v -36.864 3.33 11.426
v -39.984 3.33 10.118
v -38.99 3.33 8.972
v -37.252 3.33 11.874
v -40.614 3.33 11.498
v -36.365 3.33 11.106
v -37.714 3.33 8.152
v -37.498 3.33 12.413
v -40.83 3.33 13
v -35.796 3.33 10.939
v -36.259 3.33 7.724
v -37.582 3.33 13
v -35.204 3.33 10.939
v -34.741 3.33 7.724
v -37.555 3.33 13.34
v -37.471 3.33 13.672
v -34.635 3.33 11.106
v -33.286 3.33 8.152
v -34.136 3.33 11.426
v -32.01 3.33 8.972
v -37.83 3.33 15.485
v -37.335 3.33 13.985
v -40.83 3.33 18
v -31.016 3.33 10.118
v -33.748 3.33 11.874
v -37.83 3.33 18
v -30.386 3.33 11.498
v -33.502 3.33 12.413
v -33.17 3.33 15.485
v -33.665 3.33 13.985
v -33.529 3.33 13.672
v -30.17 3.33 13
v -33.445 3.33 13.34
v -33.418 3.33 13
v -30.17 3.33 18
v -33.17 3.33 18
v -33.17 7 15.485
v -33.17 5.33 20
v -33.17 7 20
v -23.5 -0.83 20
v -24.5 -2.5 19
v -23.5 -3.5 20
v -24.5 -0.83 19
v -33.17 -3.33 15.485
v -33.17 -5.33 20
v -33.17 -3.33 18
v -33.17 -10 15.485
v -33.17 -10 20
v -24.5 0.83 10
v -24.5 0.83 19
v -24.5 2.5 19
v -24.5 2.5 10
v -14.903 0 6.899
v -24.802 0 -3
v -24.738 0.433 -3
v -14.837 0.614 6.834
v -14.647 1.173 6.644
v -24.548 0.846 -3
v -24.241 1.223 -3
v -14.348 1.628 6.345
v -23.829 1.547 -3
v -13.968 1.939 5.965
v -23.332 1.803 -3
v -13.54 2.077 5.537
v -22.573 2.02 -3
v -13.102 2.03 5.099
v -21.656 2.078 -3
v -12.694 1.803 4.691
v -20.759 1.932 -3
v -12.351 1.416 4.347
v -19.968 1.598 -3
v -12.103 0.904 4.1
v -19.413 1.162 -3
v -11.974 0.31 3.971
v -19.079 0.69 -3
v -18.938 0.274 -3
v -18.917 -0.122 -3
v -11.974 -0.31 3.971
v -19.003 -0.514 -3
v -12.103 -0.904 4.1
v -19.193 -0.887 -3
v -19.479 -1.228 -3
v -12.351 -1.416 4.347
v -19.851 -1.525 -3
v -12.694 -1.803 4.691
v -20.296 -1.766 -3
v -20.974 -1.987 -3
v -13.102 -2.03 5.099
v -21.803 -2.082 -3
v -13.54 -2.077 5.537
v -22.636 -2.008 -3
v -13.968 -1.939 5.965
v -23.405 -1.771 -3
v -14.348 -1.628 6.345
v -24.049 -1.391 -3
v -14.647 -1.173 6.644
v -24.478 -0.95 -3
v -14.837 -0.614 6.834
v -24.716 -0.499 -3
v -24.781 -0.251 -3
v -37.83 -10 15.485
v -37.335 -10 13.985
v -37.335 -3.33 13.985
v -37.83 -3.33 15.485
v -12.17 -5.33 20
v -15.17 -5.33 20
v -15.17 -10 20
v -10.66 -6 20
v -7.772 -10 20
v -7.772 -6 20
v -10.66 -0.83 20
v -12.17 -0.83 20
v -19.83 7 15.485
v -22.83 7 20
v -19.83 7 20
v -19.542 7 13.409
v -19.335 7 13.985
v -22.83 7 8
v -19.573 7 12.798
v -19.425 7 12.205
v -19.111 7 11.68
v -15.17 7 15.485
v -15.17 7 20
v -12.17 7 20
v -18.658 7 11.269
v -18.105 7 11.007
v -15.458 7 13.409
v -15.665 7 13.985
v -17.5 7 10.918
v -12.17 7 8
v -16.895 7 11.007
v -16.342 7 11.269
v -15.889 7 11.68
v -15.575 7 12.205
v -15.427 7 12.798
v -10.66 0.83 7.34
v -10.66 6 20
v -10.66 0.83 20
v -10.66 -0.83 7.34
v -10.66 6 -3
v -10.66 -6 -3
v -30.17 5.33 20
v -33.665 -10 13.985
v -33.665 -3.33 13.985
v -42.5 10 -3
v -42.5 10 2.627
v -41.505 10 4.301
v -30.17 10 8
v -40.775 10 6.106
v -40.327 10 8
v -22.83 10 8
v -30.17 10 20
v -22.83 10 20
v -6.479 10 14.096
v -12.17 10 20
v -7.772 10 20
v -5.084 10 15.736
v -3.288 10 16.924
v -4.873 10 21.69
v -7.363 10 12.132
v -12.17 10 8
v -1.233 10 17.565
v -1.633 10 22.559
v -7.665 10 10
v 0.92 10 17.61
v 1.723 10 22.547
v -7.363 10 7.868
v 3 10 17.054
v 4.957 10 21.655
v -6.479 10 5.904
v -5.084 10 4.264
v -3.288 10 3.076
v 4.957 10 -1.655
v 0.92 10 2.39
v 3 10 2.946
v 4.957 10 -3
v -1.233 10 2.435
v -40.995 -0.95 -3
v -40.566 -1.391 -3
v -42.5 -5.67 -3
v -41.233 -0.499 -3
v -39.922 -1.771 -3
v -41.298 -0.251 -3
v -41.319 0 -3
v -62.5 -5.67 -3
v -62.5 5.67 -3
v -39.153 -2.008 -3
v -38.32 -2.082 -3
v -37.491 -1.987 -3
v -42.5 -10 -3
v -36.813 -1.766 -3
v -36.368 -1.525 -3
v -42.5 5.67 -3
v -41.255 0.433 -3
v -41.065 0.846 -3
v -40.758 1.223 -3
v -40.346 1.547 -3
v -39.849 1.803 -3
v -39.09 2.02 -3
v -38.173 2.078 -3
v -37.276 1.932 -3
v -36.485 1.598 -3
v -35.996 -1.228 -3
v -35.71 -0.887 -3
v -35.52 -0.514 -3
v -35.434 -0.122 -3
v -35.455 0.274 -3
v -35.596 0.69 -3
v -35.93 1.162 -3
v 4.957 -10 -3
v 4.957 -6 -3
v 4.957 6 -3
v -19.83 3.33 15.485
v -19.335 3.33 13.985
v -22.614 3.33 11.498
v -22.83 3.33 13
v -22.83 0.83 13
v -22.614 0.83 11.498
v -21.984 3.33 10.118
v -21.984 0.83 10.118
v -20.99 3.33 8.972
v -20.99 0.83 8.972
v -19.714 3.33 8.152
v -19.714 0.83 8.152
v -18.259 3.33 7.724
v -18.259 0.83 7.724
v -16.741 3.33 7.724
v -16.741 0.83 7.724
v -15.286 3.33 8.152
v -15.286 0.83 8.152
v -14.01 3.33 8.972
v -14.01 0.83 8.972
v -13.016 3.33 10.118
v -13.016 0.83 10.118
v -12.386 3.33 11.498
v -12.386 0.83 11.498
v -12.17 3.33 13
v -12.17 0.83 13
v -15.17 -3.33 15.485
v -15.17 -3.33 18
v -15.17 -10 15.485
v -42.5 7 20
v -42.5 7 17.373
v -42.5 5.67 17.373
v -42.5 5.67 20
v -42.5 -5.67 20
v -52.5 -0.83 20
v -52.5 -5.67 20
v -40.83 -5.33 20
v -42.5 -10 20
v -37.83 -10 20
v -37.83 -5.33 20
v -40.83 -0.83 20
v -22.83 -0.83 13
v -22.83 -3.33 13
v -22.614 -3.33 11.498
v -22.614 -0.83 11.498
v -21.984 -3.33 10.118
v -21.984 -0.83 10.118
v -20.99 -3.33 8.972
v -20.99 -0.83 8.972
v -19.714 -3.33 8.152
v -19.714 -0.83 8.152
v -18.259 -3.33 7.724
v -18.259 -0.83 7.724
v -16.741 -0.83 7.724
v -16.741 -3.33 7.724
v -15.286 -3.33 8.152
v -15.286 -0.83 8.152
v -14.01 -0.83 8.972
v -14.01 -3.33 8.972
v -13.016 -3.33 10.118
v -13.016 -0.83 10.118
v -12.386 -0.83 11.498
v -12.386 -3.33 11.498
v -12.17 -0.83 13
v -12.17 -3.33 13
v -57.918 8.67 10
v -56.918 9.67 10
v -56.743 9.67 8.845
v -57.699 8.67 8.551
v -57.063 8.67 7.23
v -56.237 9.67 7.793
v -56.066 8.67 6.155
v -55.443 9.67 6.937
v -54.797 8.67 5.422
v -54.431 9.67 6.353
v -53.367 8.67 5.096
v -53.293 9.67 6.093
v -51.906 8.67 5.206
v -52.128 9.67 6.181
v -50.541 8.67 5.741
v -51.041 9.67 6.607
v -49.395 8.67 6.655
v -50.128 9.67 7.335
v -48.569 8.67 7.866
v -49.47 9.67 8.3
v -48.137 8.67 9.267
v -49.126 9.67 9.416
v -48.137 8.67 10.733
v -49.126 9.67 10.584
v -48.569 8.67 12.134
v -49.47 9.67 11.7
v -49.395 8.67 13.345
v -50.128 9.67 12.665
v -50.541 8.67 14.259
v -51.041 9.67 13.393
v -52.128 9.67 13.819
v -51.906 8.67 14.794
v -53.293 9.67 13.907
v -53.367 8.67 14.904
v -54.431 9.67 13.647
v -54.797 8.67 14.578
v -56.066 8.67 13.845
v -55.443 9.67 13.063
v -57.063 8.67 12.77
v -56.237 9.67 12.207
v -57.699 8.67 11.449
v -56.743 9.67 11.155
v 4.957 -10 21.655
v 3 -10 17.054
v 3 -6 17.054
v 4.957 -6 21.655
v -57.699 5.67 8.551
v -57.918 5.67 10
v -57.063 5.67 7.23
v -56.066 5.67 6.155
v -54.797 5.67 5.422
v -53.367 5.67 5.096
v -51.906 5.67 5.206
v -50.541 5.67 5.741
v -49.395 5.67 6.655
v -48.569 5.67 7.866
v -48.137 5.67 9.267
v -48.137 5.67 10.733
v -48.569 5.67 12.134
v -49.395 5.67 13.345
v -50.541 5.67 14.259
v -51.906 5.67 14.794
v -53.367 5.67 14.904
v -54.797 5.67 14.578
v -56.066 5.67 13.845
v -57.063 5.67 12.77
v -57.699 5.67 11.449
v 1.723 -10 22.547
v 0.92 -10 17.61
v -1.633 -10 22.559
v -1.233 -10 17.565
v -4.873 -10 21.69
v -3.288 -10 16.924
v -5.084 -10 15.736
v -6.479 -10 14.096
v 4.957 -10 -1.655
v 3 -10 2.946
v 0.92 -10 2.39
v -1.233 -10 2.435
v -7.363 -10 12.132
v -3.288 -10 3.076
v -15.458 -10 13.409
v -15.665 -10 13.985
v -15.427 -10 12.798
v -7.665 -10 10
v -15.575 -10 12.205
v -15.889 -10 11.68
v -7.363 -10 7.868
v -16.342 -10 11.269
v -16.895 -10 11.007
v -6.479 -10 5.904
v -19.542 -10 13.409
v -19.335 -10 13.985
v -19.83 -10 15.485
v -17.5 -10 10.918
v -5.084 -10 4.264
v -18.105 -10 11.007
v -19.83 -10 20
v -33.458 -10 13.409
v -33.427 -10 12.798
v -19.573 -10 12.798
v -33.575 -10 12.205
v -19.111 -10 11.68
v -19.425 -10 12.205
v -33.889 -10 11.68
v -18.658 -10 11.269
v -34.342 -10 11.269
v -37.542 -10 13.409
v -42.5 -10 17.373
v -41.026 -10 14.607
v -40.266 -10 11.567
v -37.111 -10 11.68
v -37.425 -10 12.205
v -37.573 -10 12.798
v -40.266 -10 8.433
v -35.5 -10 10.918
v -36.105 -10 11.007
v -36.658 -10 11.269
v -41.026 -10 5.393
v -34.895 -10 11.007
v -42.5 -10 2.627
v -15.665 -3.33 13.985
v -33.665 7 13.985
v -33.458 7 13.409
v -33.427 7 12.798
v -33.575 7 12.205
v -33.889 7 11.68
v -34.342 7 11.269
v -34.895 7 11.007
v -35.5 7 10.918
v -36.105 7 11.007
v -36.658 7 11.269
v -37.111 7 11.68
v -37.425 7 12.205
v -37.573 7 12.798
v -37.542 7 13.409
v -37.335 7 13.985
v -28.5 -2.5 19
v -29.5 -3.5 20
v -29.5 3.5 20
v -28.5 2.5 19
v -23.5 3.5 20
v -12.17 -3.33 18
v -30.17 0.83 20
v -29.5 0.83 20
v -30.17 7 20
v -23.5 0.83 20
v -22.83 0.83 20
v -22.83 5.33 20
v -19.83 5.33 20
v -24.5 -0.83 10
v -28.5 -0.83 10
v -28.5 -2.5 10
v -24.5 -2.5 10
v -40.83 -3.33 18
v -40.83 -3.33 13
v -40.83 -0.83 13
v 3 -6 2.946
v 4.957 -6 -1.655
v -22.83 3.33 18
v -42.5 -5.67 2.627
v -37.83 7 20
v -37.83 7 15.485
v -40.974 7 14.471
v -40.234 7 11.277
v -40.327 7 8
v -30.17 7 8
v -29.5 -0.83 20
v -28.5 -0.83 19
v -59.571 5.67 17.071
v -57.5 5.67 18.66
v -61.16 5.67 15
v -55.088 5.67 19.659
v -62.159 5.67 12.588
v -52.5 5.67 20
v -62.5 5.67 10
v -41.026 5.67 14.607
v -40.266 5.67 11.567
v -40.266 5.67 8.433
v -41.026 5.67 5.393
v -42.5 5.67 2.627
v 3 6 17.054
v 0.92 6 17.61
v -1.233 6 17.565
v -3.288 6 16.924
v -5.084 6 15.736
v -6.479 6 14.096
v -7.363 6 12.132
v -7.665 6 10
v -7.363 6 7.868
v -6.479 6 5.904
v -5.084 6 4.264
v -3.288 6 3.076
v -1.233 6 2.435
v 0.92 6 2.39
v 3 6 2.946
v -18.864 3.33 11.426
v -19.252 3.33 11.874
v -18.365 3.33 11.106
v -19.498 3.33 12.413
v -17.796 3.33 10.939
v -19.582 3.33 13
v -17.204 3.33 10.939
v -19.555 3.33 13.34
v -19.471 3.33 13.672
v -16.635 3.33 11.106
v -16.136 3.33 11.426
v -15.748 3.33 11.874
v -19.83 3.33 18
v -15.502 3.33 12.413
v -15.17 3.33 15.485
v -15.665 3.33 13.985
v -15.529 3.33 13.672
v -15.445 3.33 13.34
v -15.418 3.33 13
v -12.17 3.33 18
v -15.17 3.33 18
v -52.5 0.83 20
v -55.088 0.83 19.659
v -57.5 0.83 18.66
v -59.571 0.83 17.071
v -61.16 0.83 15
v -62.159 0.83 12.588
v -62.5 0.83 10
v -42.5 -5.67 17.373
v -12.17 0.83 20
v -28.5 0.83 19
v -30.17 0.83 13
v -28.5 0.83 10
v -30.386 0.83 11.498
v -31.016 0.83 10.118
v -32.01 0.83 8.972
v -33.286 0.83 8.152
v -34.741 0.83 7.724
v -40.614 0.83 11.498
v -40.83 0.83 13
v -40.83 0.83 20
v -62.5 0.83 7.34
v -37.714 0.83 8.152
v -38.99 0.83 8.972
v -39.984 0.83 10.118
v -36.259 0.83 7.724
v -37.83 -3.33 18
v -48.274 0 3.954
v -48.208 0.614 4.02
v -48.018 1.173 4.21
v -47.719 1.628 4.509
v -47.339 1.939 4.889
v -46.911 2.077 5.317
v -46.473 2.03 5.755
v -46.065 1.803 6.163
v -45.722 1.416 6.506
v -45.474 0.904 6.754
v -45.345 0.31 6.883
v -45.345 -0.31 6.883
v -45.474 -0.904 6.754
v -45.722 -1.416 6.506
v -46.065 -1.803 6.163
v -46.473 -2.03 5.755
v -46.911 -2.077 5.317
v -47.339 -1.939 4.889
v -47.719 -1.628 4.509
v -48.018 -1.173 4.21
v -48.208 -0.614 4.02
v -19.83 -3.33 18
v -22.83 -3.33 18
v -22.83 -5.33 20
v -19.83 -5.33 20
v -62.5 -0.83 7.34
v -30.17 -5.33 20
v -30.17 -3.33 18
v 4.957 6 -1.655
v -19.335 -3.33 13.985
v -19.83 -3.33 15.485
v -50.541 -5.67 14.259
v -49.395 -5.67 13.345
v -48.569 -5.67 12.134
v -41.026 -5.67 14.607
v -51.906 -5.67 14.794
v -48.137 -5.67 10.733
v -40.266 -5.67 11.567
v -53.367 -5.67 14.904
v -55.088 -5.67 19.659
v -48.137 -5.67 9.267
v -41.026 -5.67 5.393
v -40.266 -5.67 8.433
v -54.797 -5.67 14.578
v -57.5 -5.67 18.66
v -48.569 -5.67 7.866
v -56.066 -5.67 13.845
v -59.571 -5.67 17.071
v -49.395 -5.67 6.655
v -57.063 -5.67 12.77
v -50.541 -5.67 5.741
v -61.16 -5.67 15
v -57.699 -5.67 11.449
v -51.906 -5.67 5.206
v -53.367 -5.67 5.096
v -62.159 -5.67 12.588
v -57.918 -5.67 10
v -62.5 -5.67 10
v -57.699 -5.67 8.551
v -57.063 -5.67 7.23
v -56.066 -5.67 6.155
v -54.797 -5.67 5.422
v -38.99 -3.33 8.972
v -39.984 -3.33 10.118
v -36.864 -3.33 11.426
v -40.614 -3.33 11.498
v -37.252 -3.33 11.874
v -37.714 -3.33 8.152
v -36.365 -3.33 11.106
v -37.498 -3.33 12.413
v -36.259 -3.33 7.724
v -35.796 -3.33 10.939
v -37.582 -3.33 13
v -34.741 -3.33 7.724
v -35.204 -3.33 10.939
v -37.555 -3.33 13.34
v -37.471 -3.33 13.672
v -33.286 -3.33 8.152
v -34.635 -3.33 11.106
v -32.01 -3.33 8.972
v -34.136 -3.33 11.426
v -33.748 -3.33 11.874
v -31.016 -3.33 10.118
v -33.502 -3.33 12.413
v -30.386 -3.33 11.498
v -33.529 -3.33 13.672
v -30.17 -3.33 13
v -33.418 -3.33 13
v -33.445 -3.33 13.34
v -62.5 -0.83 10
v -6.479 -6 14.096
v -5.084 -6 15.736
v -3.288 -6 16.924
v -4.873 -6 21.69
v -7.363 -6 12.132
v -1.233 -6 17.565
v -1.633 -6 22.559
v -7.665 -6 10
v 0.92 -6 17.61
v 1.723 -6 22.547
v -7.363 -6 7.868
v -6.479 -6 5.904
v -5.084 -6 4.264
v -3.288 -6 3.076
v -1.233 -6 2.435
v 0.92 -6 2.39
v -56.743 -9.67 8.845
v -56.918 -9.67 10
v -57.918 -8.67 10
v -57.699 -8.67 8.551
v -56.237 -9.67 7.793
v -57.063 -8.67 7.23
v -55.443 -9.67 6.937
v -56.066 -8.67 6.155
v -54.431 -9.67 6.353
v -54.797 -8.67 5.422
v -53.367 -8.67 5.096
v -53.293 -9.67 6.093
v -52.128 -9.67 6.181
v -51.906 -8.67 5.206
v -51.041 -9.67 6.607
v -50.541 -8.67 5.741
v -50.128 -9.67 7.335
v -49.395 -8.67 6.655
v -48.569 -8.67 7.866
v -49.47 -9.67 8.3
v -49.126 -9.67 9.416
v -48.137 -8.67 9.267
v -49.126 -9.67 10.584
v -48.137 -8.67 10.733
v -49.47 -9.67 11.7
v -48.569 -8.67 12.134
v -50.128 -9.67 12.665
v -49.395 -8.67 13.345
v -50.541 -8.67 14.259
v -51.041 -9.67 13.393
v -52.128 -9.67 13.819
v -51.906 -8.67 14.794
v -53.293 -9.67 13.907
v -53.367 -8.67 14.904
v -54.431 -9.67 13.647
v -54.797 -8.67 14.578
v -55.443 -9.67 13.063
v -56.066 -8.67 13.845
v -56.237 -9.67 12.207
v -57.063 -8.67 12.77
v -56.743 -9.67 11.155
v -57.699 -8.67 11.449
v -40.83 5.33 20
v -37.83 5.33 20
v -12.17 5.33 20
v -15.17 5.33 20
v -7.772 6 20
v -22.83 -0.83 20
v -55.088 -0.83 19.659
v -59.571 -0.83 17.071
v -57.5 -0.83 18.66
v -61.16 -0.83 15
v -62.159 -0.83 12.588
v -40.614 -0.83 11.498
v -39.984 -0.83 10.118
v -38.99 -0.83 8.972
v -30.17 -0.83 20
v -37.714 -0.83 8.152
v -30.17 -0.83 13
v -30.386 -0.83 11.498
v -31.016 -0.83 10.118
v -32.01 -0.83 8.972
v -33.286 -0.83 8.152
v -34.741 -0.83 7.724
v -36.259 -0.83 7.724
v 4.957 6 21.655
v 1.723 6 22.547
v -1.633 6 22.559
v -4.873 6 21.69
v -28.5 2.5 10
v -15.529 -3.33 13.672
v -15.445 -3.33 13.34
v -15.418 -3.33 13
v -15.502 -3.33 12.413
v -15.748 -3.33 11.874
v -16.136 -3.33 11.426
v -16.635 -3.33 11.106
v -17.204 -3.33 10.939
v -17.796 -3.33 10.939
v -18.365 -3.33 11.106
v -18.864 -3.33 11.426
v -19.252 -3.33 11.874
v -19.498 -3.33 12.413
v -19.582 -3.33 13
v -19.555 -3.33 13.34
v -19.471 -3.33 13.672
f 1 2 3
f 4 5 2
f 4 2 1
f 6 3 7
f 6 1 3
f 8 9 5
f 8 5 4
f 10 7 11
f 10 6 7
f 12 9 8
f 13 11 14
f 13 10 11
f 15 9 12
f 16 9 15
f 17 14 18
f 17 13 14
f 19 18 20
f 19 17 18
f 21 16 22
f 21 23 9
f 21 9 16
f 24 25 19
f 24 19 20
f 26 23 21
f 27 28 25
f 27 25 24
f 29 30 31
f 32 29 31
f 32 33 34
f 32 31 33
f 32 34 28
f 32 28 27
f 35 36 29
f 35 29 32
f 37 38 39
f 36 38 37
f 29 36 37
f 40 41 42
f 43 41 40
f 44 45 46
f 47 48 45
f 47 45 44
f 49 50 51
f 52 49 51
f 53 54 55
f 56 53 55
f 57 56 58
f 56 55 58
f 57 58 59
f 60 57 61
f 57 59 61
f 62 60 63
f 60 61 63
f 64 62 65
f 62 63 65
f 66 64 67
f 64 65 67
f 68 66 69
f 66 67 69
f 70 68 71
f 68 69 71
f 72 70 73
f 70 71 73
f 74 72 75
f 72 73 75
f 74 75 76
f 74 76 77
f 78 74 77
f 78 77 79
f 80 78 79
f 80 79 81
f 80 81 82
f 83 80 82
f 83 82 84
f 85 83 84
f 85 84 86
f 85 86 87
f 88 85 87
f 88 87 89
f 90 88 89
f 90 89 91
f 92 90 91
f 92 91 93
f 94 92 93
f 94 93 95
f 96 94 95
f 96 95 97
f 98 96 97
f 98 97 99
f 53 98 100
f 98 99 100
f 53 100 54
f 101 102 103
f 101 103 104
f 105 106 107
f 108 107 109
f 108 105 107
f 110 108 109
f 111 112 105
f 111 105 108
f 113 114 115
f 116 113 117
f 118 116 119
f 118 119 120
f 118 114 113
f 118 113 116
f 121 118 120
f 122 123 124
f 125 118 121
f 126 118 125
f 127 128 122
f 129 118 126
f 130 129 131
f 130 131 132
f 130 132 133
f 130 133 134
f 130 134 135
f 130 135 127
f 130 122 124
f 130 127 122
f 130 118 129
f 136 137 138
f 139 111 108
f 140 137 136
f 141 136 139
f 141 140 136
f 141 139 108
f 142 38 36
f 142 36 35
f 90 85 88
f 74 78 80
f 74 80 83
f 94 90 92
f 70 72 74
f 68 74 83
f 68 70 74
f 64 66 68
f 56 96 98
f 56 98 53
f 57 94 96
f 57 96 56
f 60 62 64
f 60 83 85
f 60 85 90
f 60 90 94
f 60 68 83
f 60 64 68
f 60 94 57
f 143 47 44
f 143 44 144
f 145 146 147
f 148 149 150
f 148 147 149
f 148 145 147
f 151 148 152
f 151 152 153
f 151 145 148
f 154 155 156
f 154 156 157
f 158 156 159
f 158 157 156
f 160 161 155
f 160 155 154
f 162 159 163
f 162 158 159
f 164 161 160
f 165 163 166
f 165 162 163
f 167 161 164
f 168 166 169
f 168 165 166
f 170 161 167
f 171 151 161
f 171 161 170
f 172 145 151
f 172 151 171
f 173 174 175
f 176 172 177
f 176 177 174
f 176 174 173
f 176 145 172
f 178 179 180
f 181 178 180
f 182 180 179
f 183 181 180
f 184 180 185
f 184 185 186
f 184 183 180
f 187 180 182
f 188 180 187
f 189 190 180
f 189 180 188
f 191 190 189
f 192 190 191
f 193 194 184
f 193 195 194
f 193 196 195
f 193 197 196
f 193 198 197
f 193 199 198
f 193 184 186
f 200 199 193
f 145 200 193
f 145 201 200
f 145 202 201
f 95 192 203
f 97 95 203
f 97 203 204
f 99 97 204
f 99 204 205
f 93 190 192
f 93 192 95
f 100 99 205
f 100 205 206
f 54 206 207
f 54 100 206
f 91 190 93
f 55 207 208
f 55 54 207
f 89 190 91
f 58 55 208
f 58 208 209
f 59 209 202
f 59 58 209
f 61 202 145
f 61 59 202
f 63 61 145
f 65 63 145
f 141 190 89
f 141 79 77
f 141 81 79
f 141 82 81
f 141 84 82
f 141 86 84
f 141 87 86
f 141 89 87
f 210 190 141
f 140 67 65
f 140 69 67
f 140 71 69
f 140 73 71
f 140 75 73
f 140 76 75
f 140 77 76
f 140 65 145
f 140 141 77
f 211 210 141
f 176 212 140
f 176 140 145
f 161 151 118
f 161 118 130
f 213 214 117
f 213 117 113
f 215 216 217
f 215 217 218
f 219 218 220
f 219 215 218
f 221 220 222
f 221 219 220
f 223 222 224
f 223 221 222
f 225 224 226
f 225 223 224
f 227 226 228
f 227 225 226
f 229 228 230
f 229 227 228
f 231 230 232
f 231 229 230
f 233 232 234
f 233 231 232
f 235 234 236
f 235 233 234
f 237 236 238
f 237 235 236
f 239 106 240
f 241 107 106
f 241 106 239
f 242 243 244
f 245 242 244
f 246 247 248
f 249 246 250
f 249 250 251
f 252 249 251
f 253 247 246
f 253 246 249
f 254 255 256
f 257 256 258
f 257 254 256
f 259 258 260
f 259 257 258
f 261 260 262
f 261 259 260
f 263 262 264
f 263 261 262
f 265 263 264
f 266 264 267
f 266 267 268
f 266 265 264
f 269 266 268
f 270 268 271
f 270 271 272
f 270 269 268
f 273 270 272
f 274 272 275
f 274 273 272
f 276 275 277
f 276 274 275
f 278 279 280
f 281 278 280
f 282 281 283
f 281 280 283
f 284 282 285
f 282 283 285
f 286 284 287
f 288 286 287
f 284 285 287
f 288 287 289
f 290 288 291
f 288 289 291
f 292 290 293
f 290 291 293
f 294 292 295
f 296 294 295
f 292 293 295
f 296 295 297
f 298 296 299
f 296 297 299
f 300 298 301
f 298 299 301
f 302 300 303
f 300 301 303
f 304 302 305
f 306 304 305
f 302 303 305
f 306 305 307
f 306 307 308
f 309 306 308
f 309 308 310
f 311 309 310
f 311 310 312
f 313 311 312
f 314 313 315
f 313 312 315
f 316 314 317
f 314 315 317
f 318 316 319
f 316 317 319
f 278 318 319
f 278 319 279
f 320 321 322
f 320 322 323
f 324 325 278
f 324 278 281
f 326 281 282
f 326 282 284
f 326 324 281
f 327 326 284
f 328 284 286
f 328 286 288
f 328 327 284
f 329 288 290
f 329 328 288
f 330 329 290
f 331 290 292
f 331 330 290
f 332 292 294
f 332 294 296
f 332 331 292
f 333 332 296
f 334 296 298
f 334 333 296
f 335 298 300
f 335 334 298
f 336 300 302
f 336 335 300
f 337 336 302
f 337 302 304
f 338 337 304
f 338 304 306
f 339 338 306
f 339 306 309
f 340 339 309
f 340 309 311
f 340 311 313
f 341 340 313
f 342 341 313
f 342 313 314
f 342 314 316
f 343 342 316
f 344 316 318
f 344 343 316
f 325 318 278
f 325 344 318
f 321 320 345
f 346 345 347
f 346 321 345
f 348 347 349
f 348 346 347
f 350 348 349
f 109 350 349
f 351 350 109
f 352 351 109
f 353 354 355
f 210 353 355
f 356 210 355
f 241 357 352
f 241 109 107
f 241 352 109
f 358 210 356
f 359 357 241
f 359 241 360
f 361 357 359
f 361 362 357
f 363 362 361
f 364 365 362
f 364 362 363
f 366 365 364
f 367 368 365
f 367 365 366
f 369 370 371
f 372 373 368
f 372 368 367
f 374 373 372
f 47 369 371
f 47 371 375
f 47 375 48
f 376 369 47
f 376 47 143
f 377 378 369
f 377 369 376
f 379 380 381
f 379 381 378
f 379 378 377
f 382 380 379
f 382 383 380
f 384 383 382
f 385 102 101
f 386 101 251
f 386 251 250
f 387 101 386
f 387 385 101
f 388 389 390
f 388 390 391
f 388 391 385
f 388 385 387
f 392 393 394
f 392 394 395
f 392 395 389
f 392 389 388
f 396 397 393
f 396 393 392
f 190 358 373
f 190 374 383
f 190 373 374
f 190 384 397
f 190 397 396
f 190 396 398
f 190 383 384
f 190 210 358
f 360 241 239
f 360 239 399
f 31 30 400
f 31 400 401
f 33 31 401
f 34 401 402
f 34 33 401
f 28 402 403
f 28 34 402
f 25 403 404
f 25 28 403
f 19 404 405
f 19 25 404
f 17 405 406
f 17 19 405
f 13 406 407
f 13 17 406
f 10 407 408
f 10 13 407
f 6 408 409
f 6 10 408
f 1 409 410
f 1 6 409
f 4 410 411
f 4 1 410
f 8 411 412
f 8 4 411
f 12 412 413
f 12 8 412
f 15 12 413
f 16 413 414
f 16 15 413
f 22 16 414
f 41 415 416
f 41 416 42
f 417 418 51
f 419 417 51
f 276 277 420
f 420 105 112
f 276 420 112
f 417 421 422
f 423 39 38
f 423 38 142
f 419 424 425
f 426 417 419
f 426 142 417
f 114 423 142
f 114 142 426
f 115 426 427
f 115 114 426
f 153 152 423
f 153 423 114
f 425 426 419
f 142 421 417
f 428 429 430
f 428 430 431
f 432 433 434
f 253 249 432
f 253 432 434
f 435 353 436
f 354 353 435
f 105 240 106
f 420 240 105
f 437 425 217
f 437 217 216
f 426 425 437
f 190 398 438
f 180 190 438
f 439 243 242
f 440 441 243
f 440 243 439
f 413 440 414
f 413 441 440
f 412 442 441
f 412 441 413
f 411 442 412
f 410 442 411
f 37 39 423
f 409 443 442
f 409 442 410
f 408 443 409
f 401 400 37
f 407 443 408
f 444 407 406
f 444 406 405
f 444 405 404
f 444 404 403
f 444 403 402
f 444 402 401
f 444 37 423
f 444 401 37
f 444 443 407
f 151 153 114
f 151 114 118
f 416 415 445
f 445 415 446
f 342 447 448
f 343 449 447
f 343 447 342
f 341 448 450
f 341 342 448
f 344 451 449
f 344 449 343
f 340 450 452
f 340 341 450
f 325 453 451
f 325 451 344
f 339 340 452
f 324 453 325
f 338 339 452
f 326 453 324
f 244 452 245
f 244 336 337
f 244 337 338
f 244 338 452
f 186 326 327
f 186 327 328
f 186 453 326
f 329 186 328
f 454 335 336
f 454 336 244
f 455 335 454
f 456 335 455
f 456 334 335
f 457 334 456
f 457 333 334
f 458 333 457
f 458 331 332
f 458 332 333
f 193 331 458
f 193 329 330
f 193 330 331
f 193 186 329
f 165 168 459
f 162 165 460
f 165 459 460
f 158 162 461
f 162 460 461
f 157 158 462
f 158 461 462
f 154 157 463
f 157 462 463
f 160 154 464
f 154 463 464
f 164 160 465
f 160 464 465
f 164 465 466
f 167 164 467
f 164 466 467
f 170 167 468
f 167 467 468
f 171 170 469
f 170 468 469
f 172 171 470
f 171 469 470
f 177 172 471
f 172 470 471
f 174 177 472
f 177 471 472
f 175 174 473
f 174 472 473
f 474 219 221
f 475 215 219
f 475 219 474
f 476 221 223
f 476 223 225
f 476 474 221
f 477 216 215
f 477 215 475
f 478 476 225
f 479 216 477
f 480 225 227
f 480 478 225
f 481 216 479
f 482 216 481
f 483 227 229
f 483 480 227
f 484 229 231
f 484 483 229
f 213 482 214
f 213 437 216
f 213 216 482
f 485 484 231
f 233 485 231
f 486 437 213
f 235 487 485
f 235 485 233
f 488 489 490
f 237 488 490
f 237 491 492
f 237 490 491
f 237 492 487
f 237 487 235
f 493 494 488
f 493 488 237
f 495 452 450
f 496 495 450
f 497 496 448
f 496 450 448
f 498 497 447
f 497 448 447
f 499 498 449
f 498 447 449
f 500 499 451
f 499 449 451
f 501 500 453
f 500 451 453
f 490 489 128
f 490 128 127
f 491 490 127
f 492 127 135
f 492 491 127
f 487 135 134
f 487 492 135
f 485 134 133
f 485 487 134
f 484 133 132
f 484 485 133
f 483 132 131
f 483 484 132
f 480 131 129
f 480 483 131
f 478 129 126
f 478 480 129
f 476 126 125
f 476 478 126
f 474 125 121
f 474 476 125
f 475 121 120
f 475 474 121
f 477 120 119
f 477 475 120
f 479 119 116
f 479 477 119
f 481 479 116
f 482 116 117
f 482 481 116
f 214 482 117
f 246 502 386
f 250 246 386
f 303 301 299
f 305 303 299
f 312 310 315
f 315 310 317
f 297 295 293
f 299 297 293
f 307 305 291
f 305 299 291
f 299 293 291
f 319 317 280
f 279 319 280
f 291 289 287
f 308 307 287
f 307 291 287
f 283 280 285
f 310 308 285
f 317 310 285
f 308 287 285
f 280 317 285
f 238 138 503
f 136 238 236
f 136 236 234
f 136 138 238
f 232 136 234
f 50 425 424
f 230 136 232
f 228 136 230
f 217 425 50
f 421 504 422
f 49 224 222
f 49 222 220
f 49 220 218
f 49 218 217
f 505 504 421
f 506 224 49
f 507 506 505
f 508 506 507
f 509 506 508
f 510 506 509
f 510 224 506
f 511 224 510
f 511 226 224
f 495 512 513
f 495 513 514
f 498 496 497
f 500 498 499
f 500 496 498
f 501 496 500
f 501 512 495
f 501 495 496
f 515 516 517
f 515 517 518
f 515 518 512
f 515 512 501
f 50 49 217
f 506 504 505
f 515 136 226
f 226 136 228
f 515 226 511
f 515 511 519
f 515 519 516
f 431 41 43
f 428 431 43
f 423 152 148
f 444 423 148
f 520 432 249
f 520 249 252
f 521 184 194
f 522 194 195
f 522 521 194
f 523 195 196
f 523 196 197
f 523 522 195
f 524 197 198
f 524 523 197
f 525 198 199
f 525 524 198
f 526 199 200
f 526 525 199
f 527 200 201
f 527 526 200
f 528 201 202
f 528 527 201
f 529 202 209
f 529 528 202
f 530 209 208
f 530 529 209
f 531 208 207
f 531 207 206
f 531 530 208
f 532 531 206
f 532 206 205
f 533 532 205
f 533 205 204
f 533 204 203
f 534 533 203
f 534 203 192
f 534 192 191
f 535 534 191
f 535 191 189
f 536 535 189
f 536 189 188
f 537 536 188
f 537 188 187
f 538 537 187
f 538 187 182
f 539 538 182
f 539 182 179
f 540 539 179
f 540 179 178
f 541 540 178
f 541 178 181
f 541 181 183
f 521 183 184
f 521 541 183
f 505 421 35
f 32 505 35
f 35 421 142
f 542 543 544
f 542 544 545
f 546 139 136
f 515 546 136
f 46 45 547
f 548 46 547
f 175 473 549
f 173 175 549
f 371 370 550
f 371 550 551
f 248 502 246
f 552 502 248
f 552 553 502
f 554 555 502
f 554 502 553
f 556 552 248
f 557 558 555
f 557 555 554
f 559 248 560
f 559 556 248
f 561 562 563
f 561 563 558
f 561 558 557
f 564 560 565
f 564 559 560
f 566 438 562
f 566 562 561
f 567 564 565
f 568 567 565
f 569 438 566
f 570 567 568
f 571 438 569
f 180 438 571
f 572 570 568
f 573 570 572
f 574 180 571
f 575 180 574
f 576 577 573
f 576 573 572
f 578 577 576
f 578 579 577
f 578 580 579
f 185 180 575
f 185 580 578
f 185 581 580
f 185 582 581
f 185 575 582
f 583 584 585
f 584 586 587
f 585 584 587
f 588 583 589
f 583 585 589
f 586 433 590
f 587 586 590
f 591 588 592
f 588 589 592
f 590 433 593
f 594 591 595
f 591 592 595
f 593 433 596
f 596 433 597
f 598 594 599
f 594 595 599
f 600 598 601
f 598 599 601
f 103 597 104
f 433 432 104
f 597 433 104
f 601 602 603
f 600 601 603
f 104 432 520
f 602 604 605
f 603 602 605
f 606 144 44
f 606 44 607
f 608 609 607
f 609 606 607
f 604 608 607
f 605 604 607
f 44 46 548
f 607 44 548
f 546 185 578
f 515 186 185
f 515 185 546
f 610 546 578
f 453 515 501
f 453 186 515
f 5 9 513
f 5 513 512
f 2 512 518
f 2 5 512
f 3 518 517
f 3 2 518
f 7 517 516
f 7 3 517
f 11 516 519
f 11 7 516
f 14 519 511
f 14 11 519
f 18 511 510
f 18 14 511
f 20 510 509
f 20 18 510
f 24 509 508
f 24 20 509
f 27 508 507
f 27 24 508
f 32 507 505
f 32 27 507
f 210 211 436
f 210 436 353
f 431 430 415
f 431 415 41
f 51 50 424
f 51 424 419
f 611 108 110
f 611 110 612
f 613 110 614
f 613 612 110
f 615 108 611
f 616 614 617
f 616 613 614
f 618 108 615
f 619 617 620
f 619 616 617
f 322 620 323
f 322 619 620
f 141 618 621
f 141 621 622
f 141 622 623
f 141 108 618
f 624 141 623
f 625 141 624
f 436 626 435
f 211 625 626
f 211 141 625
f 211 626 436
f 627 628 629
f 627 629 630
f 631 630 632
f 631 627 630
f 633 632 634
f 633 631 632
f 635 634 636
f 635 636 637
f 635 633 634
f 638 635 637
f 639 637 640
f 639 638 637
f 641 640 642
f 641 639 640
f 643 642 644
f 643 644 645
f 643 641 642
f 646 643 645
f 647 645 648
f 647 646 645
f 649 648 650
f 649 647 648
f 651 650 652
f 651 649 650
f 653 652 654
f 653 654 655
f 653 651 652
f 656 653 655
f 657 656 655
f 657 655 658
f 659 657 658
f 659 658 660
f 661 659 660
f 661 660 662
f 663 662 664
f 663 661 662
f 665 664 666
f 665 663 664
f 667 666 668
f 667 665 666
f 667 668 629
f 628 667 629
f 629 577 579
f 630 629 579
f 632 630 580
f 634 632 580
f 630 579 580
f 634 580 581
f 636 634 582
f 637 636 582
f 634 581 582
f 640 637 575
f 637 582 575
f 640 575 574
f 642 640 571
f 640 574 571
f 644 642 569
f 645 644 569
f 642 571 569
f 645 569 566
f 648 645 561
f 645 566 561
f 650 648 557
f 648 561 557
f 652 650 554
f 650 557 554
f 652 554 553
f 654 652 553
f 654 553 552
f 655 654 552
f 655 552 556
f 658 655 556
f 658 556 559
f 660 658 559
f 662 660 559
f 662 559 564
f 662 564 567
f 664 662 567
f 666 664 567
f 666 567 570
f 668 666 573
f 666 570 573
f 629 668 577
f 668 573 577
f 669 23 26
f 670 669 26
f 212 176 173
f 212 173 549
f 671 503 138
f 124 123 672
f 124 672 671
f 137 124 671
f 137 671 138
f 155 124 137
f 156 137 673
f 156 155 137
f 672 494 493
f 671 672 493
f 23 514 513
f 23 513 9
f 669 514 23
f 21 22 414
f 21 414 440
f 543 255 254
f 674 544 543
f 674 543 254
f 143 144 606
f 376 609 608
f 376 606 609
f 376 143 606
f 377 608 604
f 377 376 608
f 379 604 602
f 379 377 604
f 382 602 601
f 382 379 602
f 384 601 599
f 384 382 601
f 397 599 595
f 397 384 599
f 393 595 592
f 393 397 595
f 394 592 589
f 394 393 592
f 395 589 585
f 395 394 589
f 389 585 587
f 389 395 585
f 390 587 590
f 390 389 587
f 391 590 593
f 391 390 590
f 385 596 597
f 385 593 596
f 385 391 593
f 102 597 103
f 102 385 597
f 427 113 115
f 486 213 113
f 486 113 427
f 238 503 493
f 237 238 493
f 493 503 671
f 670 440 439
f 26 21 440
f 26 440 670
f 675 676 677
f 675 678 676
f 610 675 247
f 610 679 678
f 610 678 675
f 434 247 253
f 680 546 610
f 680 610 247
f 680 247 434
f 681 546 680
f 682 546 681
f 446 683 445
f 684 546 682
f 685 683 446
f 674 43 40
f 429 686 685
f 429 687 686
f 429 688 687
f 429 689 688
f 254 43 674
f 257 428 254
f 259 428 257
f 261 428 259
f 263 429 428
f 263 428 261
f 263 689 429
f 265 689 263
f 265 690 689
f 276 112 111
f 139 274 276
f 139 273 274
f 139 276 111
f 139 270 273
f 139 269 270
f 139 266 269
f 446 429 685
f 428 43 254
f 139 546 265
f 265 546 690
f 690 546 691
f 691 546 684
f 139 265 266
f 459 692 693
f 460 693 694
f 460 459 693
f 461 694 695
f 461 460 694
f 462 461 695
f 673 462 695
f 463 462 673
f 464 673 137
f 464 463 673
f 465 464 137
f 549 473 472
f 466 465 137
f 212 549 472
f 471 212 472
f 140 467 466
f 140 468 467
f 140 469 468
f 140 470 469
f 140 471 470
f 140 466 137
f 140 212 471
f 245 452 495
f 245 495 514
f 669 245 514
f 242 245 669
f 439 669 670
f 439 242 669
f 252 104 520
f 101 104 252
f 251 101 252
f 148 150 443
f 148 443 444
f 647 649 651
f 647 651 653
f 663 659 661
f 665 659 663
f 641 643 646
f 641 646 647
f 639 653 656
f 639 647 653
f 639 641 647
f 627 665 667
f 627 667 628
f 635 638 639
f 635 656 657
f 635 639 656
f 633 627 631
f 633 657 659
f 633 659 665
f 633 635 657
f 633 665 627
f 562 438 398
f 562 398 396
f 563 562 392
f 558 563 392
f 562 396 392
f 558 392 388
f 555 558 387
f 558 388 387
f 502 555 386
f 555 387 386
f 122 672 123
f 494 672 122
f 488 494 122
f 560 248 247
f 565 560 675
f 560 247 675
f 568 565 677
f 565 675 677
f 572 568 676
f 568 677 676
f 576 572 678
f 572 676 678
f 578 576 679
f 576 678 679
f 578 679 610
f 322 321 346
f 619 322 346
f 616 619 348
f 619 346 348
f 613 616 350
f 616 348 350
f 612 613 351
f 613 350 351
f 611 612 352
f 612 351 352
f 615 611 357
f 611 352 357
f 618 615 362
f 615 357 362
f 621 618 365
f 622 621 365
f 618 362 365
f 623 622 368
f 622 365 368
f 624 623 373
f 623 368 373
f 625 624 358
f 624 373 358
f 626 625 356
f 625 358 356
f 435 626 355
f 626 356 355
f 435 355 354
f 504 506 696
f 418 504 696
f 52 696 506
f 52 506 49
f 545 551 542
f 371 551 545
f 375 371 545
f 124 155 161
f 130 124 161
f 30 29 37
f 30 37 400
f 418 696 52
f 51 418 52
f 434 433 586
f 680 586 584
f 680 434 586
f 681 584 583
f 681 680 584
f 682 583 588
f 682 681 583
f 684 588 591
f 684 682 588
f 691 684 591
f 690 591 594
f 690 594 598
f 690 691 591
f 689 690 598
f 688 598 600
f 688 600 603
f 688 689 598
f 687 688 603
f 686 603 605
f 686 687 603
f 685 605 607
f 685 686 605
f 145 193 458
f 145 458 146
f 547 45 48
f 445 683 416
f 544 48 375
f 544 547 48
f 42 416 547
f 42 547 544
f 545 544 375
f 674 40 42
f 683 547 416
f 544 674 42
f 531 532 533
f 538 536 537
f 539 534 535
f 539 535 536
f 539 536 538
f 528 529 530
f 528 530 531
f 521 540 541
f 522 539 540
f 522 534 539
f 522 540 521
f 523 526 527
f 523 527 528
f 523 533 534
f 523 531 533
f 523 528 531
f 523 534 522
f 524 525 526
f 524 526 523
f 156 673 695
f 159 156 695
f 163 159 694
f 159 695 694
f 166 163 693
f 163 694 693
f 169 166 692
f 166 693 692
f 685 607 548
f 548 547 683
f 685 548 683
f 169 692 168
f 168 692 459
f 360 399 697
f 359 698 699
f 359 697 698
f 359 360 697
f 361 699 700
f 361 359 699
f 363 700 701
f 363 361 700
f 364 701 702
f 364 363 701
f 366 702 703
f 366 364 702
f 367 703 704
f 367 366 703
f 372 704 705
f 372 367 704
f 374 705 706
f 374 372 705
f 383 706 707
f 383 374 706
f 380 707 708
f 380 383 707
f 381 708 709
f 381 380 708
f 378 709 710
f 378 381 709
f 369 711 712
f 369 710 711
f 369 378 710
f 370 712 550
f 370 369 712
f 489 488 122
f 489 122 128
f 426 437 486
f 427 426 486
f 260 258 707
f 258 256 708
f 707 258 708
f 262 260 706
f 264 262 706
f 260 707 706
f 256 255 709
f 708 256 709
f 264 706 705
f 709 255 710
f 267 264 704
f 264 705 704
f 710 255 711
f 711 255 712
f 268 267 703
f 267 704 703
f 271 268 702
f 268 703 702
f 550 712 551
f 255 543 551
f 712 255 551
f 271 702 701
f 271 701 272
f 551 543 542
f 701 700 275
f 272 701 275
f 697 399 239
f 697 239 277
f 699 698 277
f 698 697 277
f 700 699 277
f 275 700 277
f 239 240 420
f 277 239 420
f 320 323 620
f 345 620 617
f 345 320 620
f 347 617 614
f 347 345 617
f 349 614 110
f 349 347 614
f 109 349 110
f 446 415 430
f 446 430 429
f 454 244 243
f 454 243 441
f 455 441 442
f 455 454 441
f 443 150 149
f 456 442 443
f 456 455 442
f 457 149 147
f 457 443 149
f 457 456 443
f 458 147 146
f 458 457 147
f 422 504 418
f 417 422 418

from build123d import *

# Parameters (mm, degrees)
BOSS_EXTRUDE7_DEPTH      = 20
SKETCH2_R                = 4.9175
BOSS_EXTRUDE2_DEPTH      = 4
CUT_EXTRUDE1_REACH       = 70.602
SKETCH3_R                = 7.665
SKETCH4_W                = 4
SKETCH4_H                = 5
CUT_EXTRUDE2_DEPTH       = 10
BOSS_EXTRUDE4_DEPTH      = 4
BOSS_EXTRUDE5_START      = -4
BOSS_EXTRUDE5_DEPTH      = 4
SKETCH25_R               = 12.83
SKETCH25_R_2             = 4.9175
CUT_EXTRUDE9_DEPTH       = 4.33
CUT_EXTRUDE10_START      = -4.33
CUT_EXTRUDE10_DEPTH      = 4.33
CUT_EXTRUDE5_DEPTH       = 70.42587576
SKETCH17_W               = 10.66
SKETCH17_H               = 6.66
CUT_EXTRUDE6_DEPTH       = 7
SKETCH18_W               = 3.2475
SKETCH18_H               = 6.66
SKETCH19_W               = 3.2475
SKETCH19_H               = 6.66
SKETCH20_W               = 51.84
SKETCH20_H               = 1.66
CUT_EXTRUDE7_DEPTH       = 12.66
CHAMFER2_SIZE            = 1
CHAMFER3_SIZE            = 1
CHAMFER4_SIZE            = 2
FILLET1_R                = 10
BOSS_EXTRUDE13_REACH     = 70.3
SKETCH23_W               = 10.34
SKETCH23_H               = 1.66
BOSS_EXTRUDE14_DEPTH     = 0.360269713
SKETCH24_W               = 12.33
SKETCH24_H               = 12
SKETCH24_W_2             = 10.66
CUT_EXTRUDE8_DEPTH       = 3
CHAMFER5_SIZE            = 1
CUT_EXTRUDE11_DEPTH      = 14
CUT_EXTRUDE11_DEPTH_BACK = 14
SKETCH27_R               = 2.0825
SKETCH28_R               = 2.0825
CUT_EXTRUDE12_DEPTH      = 14


with BuildPart() as part:
    # Sketch16 → Boss-Extrude7 (new body)
    with BuildSketch(Plane.XY):
        Polygon((-42.5, -10), (0, -10), (3, -10), (3, -6), (0, -6), (-10.66, -6), (-10.66, 6), (0, 6), (3, 6), (3, 10), (0, 10), (-42.5, 10), (-42.5, 5.67), (-53, 5.67), (-62.5, 5.67), (-62.5, -5.67), (-53, -5.67), (-42.5, -5.67), align=None)
    extrude(amount=BOSS_EXTRUDE7_DEPTH)

    # Sketch2 → Boss-Extrude2 (add)
    with BuildSketch(Plane.XZ.offset(5.67)):
        with Locations(Location((-53, 10, 0), (0, 0, 180))):
            Circle(SKETCH2_R)
    boss_extrude2 = extrude(amount=BOSS_EXTRUDE2_DEPTH)

    # Cut-Extrude1: up to this face of the body (flat: up to its plane)
    cut_extrude1_end = Plane(part.part.faces().sort_by_distance((-19.75, 10, 10))[0])
    # Sketch3 → Cut-Extrude1 (cut, up to the picked face)
    with BuildSketch(Plane.XZ.offset(10), mode=Mode.PRIVATE) as cut_extrude1_sk1:
        with Locations((0, 10)):
            Circle(SKETCH3_R)
    cut_extrude1_tool1 = split(extrude(cut_extrude1_sk1.sketch, amount=-CUT_EXTRUDE1_REACH, mode=Mode.PRIVATE), bisect_by=cut_extrude1_end, keep=Keep.BOTH, mode=Mode.PRIVATE)
    add(cut_extrude1_tool1.solids().sort_by(Axis((0, -10, 10), (0, 1, 0)))[0], mode=Mode.SUBTRACT)

    # Mirror1: Boss-Extrude2 across plane
    add(boss_extrude2.mirror(Plane.ZX))

    # Sketch4 → Cut-Extrude2 (cut)
    with BuildSketch(Plane.XY.offset(20)):
        with Locations((-26.5, 0)):
            Rectangle(SKETCH4_W, SKETCH4_H)
    extrude(amount=-CUT_EXTRUDE2_DEPTH, mode=Mode.SUBTRACT)

    # Sketch10 → Boss-Extrude4 (add)
    with BuildSketch(Plane.XZ.offset(10)):
        with BuildLine():
            Line((3, 17.053525714), (4.956947162, 21.654651425))
            ThreePointArc((4.956947162, 21.654651425), (-12.665, 10), (4.956947162, -1.654651425))
            Line((4.956947162, -1.654651425), (3, 2.946474286))
            ThreePointArc((3, 2.946474286), (-7.665, 10), (3, 17.053525714))
        make_face()
    extrude(amount=-BOSS_EXTRUDE4_DEPTH)

    # Sketch11 → Boss-Extrude5 (add)
    with BuildSketch(Plane(origin=(0, 10, 0), x_dir=(1, 0, 0), z_dir=(0, 1, 0)).offset(BOSS_EXTRUDE5_START)):
        with BuildLine():
            Line((4.956947162, -21.654651425), (3, -17.053525714))
            ThreePointArc((3, -17.053525714), (-7.665, -10), (3, -2.946474286))
            Line((3, -2.946474286), (4.956947162, 1.654651425))
            ThreePointArc((4.956947162, 1.654651425), (-1.632617278, 2.559330628), (-7.771886837, 0))
            Line((-7.771886837, 0), (-10.66, 0))
            Line((-10.66, 0), (-10.66, -20))
            Line((-10.66, -20), (-7.771886837, -20))
            ThreePointArc((-7.771886837, -20), (-1.632617278, -22.559330628), (4.956947162, -21.654651425))
        make_face()
    extrude(amount=BOSS_EXTRUDE5_DEPTH)

    # Sketch25 → Cut-Extrude9 (cut)
    with BuildSketch(Plane.XZ.offset(10)):
        with Locations((-53, 10)):
            Circle(SKETCH25_R)
        with Locations(Location((-53, 10, 0), (0, 0, 180))):
            Circle(SKETCH25_R_2, mode=Mode.SUBTRACT)
    extrude(amount=-CUT_EXTRUDE9_DEPTH, mode=Mode.SUBTRACT)

    # Sketch26 → Cut-Extrude10 (cut)
    with BuildSketch(Plane(origin=(0, 10, 0), x_dir=(1, 0, 0), z_dir=(0, 1, 0)).offset(CUT_EXTRUDE10_START)):
        with BuildLine():
            Line((-42.5, -2.627151161), (-42.5, -17.372848839))
            ThreePointArc((-42.5, -17.372848839), (-40.17, -10), (-42.5, -2.627151161))
        make_face()
    extrude(amount=CUT_EXTRUDE10_DEPTH, mode=Mode.SUBTRACT)

    # Sketch13 → Cut-Extrude5 (cut, through all)
    with BuildSketch(Plane.XZ.offset(10)):
        with BuildLine():
            Line((-37.83, 15.484673169), (-37.83, 20))
            Line((-37.83, 20), (-33.17, 20))
            Line((-33.17, 20), (-33.17, 15.484673169))
            Line((-33.17, 15.484673169), (-33.665, 13.984673169))
            ThreePointArc((-33.665, 13.984673169), (-35.5, 10.9175), (-37.335, 13.984673169))
            Line((-37.335, 13.984673169), (-37.83, 15.484673169))
        make_face()
        with BuildLine():
            Line((-19.83, 15.484673169), (-19.83, 20))
            Line((-19.83, 20), (-15.17, 20))
            Line((-15.17, 20), (-15.17, 15.484673169))
            Line((-15.17, 15.484673169), (-15.665, 13.984673169))
            ThreePointArc((-15.665, 13.984673169), (-17.5, 10.9175), (-19.335, 13.984673169))
            Line((-19.335, 13.984673169), (-19.83, 15.484673169))
        make_face()
    extrude(amount=-CUT_EXTRUDE5_DEPTH, mode=Mode.SUBTRACT)

    # Sketch17 → Cut-Extrude6 (cut)
    with BuildSketch(Plane.XY.offset(20)):
        with Locations((-35.5, 0)):
            Rectangle(SKETCH17_W, SKETCH17_H)
        with Locations((-17.5, 0)):
            Rectangle(SKETCH17_W, SKETCH17_H)
    extrude(amount=-CUT_EXTRUDE6_DEPTH, mode=Mode.SUBTRACT)

    # Sketch18 → Cut-Revolve1 (revolve, cut)
    with BuildSketch(Plane.XY.offset(13)):
        with Locations((-39.20625, 0)):
            Rectangle(SKETCH18_W, SKETCH18_H)
    revolve(axis=Axis((-35.5, 10, 13), (0, -1, 0)), mode=Mode.SUBTRACT)

    # Sketch19 → Cut-Revolve2 (revolve, cut)
    with BuildSketch(Plane.XY.offset(13)):
        with Locations((-21.20625, 0)):
            Rectangle(SKETCH19_W, SKETCH19_H)
    revolve(axis=Axis((-17.5, 10, 13), (0, -1, 0)), mode=Mode.SUBTRACT)

    # Sketch20 → Cut-Extrude7 (cut)
    with BuildSketch(Plane.XY.offset(20)):
        with Locations((-36.58, 0)):
            Rectangle(SKETCH20_W, SKETCH20_H)
    extrude(amount=-CUT_EXTRUDE7_DEPTH, mode=Mode.SUBTRACT)

    # Chamfer2
    chamfer2_edges = [part.edges().sort_by_distance(p)[0] for p in [
        (-48.0825, -9.67, 10),
    ]]
    chamfer(chamfer2_edges, length=CHAMFER2_SIZE)

    # Chamfer3
    chamfer3_edges = [part.edges().sort_by_distance(p)[0] for p in [
        (-48.0825, 9.67, 10),
    ]]
    chamfer(chamfer3_edges, length=CHAMFER3_SIZE)

    # Chamfer4
    chamfer4_edges = [part.edges().sort_by_distance(p)[0] for p in [
        (-31.67, -3.33, 20),
        (-31.67, 3.33, 20),
        (-39.33, 3.33, 20),
        (-39.33, -3.33, 20),
        (-13.67, -3.33, 20),
        (-13.67, 3.33, 20),
        (-21.33, 3.33, 20),
        (-21.33, -3.33, 20),
    ]]
    chamfer(chamfer4_edges, length=CHAMFER4_SIZE)

    # Fillet1
    # the kernel refuses this fillet: 10 mm, written as the material it takes off along each edge
    with BuildSketch(Plane(origin=(-62.5, 30.67, 0), x_dir=(1, 0, 0), z_dir=(0, -1, 0))) as fillet1_piece_1:
        with BuildLine():
            CenterArc((FILLET1_R, FILLET1_R), FILLET1_R, 180, 90)
            Line((0, FILLET1_R), (0, 0))
            Line((0, 0), (FILLET1_R, 0))
        make_face()
    extrude(amount=61.34, mode=Mode.SUBTRACT)
    with BuildSketch(Plane(origin=(-62.5, 30.67, 20), x_dir=(1, 0, 0), z_dir=(0, -1, 0)), Plane(origin=(-62.5, 24.17, 20), x_dir=(1, 0, 0), z_dir=(0, -1, 0))) as fillet1_piece_2:
        with BuildLine():
            CenterArc((FILLET1_R, -FILLET1_R), FILLET1_R, 90, 90)
            Line((0, -FILLET1_R), (0, 0))
            Line((0, 0), (FILLET1_R, 0))
        make_face()
    extrude(amount=54.84, mode=Mode.SUBTRACT)

    # Sketch22 → Boss-Extrude13 (add, up to next)
    with BuildSketch(Plane(origin=(0, 0, -3), x_dir=(-1, 0, 0), z_dir=(0, 0, -1)), mode=Mode.PRIVATE) as boss_extrude13_sk1:
        Polygon((62.5, 5.67), (52.5, 5.67), (42.5, 5.67), (42.5, 10), (7.771886837, 10), (-4.956947162, 10), (-4.956947162, 6), (7.771886837, 6), (10.66, 6), (10.66, -6), (7.771886837, -6), (-4.956947162, -6), (-4.956947162, -10), (7.771886837, -10), (42.5, -10), (42.5, -5.67), (52.5, -5.67), (62.5, -5.67), (62.5, -0.83), (62.139730287, -0.83), (62.139730287, 0.83), (62.5, 0.83), align=None)
    boss_extrude13_tool1 = extrude(boss_extrude13_sk1.sketch, amount=-BOSS_EXTRUDE13_REACH, mode=Mode.PRIVATE) - part.part
    add(boss_extrude13_tool1.solids().sort_by_distance((-29.508071, 0, -3))[0])

    # Sketch23 → Boss-Extrude14 (add)
    with BuildSketch(Plane.ZY.offset(62.139730287)):
        with Locations((2.17, 0)):
            Rectangle(SKETCH23_W, SKETCH23_H)
    extrude(amount=BOSS_EXTRUDE14_DEPTH)

    # Sketch24 → Cut-Extrude8 (cut)
    with BuildSketch(Plane(origin=(0, 10, 0), x_dir=(1, 0, 0), z_dir=(0, 1, 0))):
        with Locations((-36.335, -14)):
            Rectangle(SKETCH24_W, SKETCH24_H)
        with Locations((-17.5, -14)):
            Rectangle(SKETCH24_W_2, SKETCH24_H)
    extrude(amount=-CUT_EXTRUDE8_DEPTH, mode=Mode.SUBTRACT)

    # Chamfer5
    chamfer5_edges = [part.edges().sort_by_distance(p)[0] for p in [
        (-24.5, 1.665, 20),
        (-28.5, -1.665, 20),
        (-26.5, -2.5, 20),
        (-24.5, -1.665, 20),
        (-26.5, 2.5, 20),
        (-28.5, 1.665, 20),
    ]]
    chamfer(chamfer5_edges, length=CHAMFER5_SIZE)

    # Sketch27 → Cut-Extrude11 (cut, two sides: drawn at the far end of the back side and taken through both)
    with BuildSketch(Plane(origin=(-16.214466094, 0, 16.214466094), x_dir=(0, 1, 0), z_dir=(0.7071067811865389, 0, -0.7071067811865561)).offset(-CUT_EXTRUDE11_DEPTH_BACK)):
        with Locations(Location((0, -29.255858544, 0), (0, 0, 270))):
            Circle(SKETCH27_R)
    extrude(amount=CUT_EXTRUDE11_DEPTH + CUT_EXTRUDE11_DEPTH_BACK, mode=Mode.SUBTRACT)

    # Sketch28 → Cut-Extrude12 (cut)
    with BuildSketch(Plane(origin=(-13.901067812, 0, -13.901067812), x_dir=(0, -1, 0), z_dir=(-0.7071067811865389, 0, -0.7071067811865561))):
        with Locations(Location((0, 13.333937944, 0), (0, 0, 90))):
            Circle(SKETCH28_R)
    extrude(amount=-CUT_EXTRUDE12_DEPTH, mode=Mode.SUBTRACT)


solid = part.part
